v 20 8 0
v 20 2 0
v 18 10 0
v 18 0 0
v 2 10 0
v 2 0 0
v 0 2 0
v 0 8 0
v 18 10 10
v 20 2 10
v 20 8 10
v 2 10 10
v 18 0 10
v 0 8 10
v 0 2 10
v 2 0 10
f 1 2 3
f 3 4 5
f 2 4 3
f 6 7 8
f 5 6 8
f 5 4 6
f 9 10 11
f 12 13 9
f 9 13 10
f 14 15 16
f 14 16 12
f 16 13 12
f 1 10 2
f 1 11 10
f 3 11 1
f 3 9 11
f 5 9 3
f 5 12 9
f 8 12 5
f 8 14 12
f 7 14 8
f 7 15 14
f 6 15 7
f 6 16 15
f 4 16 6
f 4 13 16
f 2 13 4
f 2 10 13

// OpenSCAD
$fn = 100;
width = 20;
depth = 10;
bevel = 2;

linear_extrude(height=10)
bevel_rect(width, depth, bevel);

module bevel_rect(w, d, b) {
	polygon(points = [[0 + b, 0], [w - b, 0], // bottom edge
				[w, 0+b], [w, d - b],       // right edge
				[w - b, d], [0 + b, d],     // top edge
				[0,d - b], [0, 0 + b]]);    // left edge

}
